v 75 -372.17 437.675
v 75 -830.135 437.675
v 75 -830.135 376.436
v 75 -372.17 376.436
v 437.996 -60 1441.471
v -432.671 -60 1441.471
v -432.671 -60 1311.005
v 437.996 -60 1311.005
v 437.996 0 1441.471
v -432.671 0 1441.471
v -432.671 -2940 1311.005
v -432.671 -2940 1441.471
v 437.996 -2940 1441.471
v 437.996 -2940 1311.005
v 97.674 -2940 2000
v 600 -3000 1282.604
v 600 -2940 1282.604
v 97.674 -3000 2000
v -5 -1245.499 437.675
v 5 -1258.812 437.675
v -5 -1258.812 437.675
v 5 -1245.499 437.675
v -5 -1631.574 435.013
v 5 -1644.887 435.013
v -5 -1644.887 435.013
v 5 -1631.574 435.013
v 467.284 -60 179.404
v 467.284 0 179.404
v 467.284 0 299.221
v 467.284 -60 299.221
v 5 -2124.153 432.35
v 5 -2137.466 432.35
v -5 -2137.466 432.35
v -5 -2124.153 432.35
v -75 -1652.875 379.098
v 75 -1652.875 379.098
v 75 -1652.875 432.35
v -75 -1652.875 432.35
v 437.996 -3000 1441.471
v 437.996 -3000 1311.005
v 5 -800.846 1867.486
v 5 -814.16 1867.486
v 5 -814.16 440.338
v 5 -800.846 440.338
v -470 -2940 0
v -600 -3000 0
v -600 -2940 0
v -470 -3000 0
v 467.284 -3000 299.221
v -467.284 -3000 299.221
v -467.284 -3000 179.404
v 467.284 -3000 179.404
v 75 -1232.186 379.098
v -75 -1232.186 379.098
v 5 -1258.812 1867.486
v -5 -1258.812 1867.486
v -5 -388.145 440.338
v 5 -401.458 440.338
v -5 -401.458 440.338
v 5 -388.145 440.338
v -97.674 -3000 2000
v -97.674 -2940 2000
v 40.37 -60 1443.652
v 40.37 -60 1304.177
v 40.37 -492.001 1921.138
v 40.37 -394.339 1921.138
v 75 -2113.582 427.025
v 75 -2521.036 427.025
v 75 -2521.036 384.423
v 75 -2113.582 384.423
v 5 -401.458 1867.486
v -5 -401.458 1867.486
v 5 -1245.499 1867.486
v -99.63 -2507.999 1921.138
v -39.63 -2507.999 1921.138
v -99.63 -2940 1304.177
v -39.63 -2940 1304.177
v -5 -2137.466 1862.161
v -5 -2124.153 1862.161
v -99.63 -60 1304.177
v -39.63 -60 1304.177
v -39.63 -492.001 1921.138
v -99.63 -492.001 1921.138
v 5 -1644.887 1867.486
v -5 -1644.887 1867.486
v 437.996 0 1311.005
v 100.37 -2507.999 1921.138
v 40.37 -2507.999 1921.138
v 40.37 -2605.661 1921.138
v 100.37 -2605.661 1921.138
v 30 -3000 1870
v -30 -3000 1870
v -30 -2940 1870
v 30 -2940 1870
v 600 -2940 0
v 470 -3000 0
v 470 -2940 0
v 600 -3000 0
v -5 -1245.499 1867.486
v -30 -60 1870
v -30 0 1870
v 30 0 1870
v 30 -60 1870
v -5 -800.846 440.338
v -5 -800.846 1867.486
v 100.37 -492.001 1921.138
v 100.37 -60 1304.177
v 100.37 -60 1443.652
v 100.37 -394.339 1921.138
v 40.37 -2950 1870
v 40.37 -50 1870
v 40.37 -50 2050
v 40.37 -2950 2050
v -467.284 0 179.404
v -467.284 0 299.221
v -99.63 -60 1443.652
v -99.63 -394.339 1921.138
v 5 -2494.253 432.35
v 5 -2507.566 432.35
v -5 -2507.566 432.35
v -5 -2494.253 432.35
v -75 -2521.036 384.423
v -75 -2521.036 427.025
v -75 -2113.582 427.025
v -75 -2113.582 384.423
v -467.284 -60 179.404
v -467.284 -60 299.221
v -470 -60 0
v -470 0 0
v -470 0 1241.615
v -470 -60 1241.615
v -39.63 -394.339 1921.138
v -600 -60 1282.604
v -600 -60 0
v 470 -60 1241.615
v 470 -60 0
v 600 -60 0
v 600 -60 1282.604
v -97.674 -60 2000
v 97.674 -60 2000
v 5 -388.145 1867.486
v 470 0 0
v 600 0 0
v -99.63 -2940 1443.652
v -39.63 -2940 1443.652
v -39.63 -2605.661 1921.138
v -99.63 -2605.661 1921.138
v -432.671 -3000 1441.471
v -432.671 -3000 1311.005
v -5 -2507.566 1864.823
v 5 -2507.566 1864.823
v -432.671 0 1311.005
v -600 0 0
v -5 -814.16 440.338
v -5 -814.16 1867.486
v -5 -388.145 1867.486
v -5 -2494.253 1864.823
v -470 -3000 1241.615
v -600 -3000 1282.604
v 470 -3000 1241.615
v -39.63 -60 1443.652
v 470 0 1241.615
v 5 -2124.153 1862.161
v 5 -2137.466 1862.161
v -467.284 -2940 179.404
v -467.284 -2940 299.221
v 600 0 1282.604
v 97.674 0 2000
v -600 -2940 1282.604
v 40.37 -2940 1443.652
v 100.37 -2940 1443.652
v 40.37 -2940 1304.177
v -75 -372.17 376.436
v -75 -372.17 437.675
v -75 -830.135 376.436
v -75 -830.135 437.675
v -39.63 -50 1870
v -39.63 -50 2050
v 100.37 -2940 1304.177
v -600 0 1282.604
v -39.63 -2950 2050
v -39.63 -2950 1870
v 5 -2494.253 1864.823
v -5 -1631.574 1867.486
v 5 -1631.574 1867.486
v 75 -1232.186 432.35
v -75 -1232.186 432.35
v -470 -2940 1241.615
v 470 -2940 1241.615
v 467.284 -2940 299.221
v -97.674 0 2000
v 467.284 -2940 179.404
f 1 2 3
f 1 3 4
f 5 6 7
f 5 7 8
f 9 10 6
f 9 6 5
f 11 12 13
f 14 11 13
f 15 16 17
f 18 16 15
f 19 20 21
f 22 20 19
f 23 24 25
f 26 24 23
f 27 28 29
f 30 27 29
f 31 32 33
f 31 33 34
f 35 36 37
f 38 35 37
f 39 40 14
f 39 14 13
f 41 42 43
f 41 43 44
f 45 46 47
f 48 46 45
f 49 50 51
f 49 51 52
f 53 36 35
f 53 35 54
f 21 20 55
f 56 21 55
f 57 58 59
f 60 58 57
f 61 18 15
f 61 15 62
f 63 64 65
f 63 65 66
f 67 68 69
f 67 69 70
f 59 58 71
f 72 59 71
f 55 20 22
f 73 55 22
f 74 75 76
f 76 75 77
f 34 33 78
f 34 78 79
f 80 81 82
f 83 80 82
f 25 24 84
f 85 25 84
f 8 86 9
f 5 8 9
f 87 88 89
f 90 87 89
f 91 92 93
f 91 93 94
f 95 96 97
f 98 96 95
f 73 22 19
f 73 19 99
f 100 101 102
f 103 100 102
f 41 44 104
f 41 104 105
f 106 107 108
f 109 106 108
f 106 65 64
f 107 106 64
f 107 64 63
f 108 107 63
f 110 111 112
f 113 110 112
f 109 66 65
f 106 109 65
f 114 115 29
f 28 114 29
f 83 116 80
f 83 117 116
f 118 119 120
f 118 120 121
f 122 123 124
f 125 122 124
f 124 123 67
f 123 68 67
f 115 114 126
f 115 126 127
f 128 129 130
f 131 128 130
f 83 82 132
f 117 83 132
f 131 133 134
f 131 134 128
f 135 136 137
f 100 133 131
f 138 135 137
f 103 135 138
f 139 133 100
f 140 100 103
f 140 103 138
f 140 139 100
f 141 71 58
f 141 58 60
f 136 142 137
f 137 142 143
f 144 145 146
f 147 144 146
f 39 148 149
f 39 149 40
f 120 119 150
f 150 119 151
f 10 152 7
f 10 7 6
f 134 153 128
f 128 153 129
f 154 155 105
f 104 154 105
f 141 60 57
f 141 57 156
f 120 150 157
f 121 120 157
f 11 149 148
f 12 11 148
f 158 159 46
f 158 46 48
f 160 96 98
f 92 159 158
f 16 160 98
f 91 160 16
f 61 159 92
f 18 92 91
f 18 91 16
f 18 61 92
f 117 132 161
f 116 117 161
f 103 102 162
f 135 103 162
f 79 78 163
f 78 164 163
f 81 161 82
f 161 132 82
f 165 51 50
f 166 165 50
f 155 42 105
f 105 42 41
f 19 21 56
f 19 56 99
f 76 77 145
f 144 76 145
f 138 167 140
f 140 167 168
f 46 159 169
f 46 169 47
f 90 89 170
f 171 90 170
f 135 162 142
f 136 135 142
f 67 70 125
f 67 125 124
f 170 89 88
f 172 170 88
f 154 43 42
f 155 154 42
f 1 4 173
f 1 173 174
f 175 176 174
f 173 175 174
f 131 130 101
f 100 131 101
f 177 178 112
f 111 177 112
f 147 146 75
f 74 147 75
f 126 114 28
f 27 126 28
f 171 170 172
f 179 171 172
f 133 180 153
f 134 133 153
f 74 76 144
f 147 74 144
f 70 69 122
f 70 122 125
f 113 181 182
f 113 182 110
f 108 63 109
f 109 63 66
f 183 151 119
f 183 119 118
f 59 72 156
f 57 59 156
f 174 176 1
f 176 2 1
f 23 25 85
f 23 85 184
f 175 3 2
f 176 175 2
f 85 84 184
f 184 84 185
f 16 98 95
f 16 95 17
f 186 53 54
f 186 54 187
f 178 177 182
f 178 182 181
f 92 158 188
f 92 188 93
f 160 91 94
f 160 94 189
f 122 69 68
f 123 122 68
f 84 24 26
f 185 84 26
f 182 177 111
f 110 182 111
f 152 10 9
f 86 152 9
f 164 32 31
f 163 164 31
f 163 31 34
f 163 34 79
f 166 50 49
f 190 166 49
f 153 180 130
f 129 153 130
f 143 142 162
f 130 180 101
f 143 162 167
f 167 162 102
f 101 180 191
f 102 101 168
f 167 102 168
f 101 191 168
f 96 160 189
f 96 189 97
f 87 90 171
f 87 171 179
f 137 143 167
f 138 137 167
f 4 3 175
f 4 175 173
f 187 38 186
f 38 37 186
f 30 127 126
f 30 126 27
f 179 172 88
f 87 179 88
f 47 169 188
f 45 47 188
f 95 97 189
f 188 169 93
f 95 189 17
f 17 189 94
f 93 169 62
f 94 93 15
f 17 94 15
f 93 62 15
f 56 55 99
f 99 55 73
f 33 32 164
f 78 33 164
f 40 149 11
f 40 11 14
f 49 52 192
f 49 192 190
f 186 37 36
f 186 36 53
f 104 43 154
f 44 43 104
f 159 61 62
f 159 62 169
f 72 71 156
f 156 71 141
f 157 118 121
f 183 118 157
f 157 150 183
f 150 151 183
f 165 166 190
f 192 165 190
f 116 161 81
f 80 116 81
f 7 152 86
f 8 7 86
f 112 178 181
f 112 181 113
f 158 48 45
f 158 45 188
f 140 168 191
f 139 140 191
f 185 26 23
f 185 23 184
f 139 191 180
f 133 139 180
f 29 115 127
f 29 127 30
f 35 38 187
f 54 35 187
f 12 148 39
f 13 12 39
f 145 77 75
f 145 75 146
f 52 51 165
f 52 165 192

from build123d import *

# Parameters (mm, degrees)
F1_DEPTH  = 60
F4_DEPTH  = 60
F6_START  = 50
F5_W      = 80
F5_H      = 180
F6_DEPTH  = 2900
F7_W      = 870.6667721272
F7_H      = 130.4668188095
F8_DEPTH  = 60
F7_W_2    = 934.5689117908
F7_H_2    = 119.8165267706
F9_W      = 870.6667721272
F9_H      = 130.4668188095
F10_DEPTH = 60
F9_W_2    = 934.5689117908
F9_H_2    = 119.8165267706
F12_DEPTH = 60
F14_DEPTH = 60
F15_W     = 407.454252243
F15_H     = 42.6014661789
F16_DEPTH = 75
F15_W_2   = 420.6892251968
F15_H_2   = 53.2518029213
F15_W_3   = 457.9654037952
F15_H_3   = 61.2396001816
F17_W     = 13.3130550385
F17_H     = 1432.4731528759
F18_DEPTH = 5
F17_H_2   = 1429.8106133938
F17_W_2   = 13.3129358292
F17_H_3   = 1432.4730932713
F17_H_4   = 1429.8104941845
F17_H_5   = 1427.1478950977
F17_W_3   = 13.3130252361


with BuildPart() as f1:
    # F0 (on Front) → F1 (new body)
    with BuildSketch(Plane.XZ):
        Polygon((0, 2000), (-97.6737165717, 2000), (-600, 1282.6037195877), (-600, 0), (-470, 0), (-470, 1241.6148770335), (-30, 1870), (0, 1870), (30, 1870), (470, 1241.6148770335), (470, 0), (600, 0), (600, 1282.6037195877), (97.6737165717, 2000), align=None)
    extrude(amount=F1_DEPTH)


with BuildPart() as f4:
    # F3 (on offset) → F4 (new body)
    with BuildSketch(Plane.XZ.offset(3000)):
        Polygon((-470, 1241.6148770335), (-30, 1870), (30, 1870), (470, 1241.6148770335), (470, 0), (600, 0), (600, 1282.6037195877), (97.6737165717, 2000), (-97.6737165717, 2000), (-600, 1282.6037195877), (-600, 0), (-470, 0), align=None)
    extrude(amount=-F4_DEPTH)


with BuildPart() as f6:
    # F5 (on Front) → F6 (new body)
    with BuildSketch(Plane.XZ.offset(F6_START)):
        with Locations((0.3702357411, 1960)):
            Rectangle(F5_W, F5_H)
    extrude(amount=F6_DEPTH)


with BuildPart() as f8:
    # F7 (on offset) → F8 (new body)
    with BuildSketch(Plane.XZ.offset(3000)):
        with Locations((2.6626139879, 1376.2380480766)):
            Rectangle(F7_W, F7_H)
    extrude(amount=-F8_DEPTH)


with BuildPart() as f8b:
    # F7 (on offset) → F8, piece 2 (new body)
    with BuildSketch(Plane.XZ.offset(3000)):
        with Locations((1.49012e-05, 239.3123582006)):
            Rectangle(F7_W_2, F7_H_2)
    extrude(amount=-F8_DEPTH)


with BuildPart() as f10:
    # F9 (on Front) → F10 (new body)
    with BuildSketch(Plane.XZ):
        with Locations((2.6626139879, 1376.2380480766)):
            Rectangle(F9_W, F9_H)
    extrude(amount=F10_DEPTH)


with BuildPart() as f10b:
    # F9 (on Front) → F10, piece 2 (new body)
    with BuildSketch(Plane.XZ):
        with Locations((1.49012e-05, 239.3123582006)):
            Rectangle(F9_W_2, F9_H_2)
    extrude(amount=F10_DEPTH)


with BuildPart() as f12:
    # F11 (on face) → F12 (new body)
    with BuildSketch(Plane.YZ.offset(40.3702357411)):
        Polygon((-2605.6609946425, 1921.1378563019), (-2940, 1443.6522722244), (-2940, 1304.1765285747), (-2507.9990275416, 1921.1378563019), align=None)
    extrude(amount=F12_DEPTH)


with BuildPart() as f12b:
    # F11 (on face) → F12, piece 2 (new body)
    with BuildSketch(Plane.YZ.offset(40.3702357411)):
        Polygon((-394.3390053575, 1921.1378563019), (-492.0009724584, 1921.1378563019), (-60, 1304.1765285747), (-60, 1443.6522722244), align=None)
    extrude(amount=F12_DEPTH)


with BuildPart() as f14:
    # F13 (on face) → F14 (new body)
    with BuildSketch(Plane(origin=(-39.6297642589, 0, 0), x_dir=(0, -1, 0), z_dir=(-1, 0, 0))):
        Polygon((2507.9990275416, 1921.1378563019), (2940, 1304.1765285747), (2940, 1443.6522722244), (2605.6609946425, 1921.1378563019), align=None)
    extrude(amount=F14_DEPTH)


with BuildPart() as f14b:
    # F13 (on face) → F14, piece 2 (new body)
    with BuildSketch(Plane(origin=(-39.6297642589, 0, 0), x_dir=(0, -1, 0), z_dir=(-1, 0, 0))):
        Polygon((60, 1443.6522722244), (60, 1304.1765285747), (492.0009724584, 1921.1378563019), (394.3390053575, 1921.1378563019), align=None)
    extrude(amount=F14_DEPTH)


with BuildPart() as f16:
    # F15 (on Right) → F16 (new body, symmetric)
    with BuildSketch(Plane.YZ):
        with Locations((-2317.3087835312, 405.7241678238)):
            Rectangle(F15_W, F15_H)
    extrude(amount=F16_DEPTH, both=True)


with BuildPart() as f16b:
    # F15 (on Right) → F16, piece 2 (new body, symmetric)
    with BuildSketch(Plane.YZ):
        with Locations((-1442.5305724144, 405.7241678238)):
            Rectangle(F15_W_2, F15_H_2)
    extrude(amount=F16_DEPTH, both=True)


with BuildPart() as f16c:
    # F15 (on Right) → F16, piece 3 (new body, symmetric)
    with BuildSketch(Plane.YZ):
        with Locations((-601.1522859335, 407.0554673672)):
            Rectangle(F15_W_3, F15_H_3)
    extrude(amount=F16_DEPTH, both=True)


with BuildPart() as f18:
    # F17 (on Right) → F18 (new body, symmetric)
    with BuildSketch(Plane.YZ):
        with Locations((-2500.9099245071, 1148.5866457224)):
            Rectangle(F17_W, F17_H)
    extrude(amount=F18_DEPTH, both=True)


with BuildPart() as f18b:
    # F17 (on Right) → F18, piece 2 (new body, symmetric)
    with BuildSketch(Plane.YZ):
        with Locations((-2130.8099031448, 1147.2553759813)):
            Rectangle(F17_W, F17_H_2)
    extrude(amount=F18_DEPTH, both=True)


with BuildPart() as f18c:
    # F17 (on Right) → F18, piece 3 (new body, symmetric)
    with BuildSketch(Plane.YZ):
        with Locations((-1638.2308602333, 1151.2492150068)):
            Rectangle(F17_W_2, F17_H_3)
    extrude(amount=F18_DEPTH, both=True)


with BuildPart() as f18d:
    # F17 (on Right) → F18, piece 4 (new body, symmetric)
    with BuildSketch(Plane.YZ):
        with Locations((-1252.1554231644, 1152.5805145502)):
            Rectangle(F17_W, F17_H_4)
    extrude(amount=F18_DEPTH, both=True)


with BuildPart() as f18e:
    # F17 (on Right) → F18, piece 5 (new body, symmetric)
    with BuildSketch(Plane.YZ):
        with Locations((-807.5029850006, 1153.9118140936)):
            Rectangle(F17_W, F17_H_5)
    extrude(amount=F18_DEPTH, both=True)


with BuildPart() as f18f:
    # F17 (on Right) → F18, piece 6 (new body, symmetric)
    with BuildSketch(Plane.YZ):
        with Locations((-394.8016017675, 1153.9118140936)):
            Rectangle(F17_W_3, F17_H_5)
    extrude(amount=F18_DEPTH, both=True)


solid = Compound([f1.part, f4.part, f6.part, f8.part, f8b.part, f10.part, f10b.part, f12.part, f12b.part, f14.part, f14b.part, f16.part, f16b.part, f16c.part, f18.part, f18b.part, f18c.part, f18d.part, f18e.part, f18f.part])
